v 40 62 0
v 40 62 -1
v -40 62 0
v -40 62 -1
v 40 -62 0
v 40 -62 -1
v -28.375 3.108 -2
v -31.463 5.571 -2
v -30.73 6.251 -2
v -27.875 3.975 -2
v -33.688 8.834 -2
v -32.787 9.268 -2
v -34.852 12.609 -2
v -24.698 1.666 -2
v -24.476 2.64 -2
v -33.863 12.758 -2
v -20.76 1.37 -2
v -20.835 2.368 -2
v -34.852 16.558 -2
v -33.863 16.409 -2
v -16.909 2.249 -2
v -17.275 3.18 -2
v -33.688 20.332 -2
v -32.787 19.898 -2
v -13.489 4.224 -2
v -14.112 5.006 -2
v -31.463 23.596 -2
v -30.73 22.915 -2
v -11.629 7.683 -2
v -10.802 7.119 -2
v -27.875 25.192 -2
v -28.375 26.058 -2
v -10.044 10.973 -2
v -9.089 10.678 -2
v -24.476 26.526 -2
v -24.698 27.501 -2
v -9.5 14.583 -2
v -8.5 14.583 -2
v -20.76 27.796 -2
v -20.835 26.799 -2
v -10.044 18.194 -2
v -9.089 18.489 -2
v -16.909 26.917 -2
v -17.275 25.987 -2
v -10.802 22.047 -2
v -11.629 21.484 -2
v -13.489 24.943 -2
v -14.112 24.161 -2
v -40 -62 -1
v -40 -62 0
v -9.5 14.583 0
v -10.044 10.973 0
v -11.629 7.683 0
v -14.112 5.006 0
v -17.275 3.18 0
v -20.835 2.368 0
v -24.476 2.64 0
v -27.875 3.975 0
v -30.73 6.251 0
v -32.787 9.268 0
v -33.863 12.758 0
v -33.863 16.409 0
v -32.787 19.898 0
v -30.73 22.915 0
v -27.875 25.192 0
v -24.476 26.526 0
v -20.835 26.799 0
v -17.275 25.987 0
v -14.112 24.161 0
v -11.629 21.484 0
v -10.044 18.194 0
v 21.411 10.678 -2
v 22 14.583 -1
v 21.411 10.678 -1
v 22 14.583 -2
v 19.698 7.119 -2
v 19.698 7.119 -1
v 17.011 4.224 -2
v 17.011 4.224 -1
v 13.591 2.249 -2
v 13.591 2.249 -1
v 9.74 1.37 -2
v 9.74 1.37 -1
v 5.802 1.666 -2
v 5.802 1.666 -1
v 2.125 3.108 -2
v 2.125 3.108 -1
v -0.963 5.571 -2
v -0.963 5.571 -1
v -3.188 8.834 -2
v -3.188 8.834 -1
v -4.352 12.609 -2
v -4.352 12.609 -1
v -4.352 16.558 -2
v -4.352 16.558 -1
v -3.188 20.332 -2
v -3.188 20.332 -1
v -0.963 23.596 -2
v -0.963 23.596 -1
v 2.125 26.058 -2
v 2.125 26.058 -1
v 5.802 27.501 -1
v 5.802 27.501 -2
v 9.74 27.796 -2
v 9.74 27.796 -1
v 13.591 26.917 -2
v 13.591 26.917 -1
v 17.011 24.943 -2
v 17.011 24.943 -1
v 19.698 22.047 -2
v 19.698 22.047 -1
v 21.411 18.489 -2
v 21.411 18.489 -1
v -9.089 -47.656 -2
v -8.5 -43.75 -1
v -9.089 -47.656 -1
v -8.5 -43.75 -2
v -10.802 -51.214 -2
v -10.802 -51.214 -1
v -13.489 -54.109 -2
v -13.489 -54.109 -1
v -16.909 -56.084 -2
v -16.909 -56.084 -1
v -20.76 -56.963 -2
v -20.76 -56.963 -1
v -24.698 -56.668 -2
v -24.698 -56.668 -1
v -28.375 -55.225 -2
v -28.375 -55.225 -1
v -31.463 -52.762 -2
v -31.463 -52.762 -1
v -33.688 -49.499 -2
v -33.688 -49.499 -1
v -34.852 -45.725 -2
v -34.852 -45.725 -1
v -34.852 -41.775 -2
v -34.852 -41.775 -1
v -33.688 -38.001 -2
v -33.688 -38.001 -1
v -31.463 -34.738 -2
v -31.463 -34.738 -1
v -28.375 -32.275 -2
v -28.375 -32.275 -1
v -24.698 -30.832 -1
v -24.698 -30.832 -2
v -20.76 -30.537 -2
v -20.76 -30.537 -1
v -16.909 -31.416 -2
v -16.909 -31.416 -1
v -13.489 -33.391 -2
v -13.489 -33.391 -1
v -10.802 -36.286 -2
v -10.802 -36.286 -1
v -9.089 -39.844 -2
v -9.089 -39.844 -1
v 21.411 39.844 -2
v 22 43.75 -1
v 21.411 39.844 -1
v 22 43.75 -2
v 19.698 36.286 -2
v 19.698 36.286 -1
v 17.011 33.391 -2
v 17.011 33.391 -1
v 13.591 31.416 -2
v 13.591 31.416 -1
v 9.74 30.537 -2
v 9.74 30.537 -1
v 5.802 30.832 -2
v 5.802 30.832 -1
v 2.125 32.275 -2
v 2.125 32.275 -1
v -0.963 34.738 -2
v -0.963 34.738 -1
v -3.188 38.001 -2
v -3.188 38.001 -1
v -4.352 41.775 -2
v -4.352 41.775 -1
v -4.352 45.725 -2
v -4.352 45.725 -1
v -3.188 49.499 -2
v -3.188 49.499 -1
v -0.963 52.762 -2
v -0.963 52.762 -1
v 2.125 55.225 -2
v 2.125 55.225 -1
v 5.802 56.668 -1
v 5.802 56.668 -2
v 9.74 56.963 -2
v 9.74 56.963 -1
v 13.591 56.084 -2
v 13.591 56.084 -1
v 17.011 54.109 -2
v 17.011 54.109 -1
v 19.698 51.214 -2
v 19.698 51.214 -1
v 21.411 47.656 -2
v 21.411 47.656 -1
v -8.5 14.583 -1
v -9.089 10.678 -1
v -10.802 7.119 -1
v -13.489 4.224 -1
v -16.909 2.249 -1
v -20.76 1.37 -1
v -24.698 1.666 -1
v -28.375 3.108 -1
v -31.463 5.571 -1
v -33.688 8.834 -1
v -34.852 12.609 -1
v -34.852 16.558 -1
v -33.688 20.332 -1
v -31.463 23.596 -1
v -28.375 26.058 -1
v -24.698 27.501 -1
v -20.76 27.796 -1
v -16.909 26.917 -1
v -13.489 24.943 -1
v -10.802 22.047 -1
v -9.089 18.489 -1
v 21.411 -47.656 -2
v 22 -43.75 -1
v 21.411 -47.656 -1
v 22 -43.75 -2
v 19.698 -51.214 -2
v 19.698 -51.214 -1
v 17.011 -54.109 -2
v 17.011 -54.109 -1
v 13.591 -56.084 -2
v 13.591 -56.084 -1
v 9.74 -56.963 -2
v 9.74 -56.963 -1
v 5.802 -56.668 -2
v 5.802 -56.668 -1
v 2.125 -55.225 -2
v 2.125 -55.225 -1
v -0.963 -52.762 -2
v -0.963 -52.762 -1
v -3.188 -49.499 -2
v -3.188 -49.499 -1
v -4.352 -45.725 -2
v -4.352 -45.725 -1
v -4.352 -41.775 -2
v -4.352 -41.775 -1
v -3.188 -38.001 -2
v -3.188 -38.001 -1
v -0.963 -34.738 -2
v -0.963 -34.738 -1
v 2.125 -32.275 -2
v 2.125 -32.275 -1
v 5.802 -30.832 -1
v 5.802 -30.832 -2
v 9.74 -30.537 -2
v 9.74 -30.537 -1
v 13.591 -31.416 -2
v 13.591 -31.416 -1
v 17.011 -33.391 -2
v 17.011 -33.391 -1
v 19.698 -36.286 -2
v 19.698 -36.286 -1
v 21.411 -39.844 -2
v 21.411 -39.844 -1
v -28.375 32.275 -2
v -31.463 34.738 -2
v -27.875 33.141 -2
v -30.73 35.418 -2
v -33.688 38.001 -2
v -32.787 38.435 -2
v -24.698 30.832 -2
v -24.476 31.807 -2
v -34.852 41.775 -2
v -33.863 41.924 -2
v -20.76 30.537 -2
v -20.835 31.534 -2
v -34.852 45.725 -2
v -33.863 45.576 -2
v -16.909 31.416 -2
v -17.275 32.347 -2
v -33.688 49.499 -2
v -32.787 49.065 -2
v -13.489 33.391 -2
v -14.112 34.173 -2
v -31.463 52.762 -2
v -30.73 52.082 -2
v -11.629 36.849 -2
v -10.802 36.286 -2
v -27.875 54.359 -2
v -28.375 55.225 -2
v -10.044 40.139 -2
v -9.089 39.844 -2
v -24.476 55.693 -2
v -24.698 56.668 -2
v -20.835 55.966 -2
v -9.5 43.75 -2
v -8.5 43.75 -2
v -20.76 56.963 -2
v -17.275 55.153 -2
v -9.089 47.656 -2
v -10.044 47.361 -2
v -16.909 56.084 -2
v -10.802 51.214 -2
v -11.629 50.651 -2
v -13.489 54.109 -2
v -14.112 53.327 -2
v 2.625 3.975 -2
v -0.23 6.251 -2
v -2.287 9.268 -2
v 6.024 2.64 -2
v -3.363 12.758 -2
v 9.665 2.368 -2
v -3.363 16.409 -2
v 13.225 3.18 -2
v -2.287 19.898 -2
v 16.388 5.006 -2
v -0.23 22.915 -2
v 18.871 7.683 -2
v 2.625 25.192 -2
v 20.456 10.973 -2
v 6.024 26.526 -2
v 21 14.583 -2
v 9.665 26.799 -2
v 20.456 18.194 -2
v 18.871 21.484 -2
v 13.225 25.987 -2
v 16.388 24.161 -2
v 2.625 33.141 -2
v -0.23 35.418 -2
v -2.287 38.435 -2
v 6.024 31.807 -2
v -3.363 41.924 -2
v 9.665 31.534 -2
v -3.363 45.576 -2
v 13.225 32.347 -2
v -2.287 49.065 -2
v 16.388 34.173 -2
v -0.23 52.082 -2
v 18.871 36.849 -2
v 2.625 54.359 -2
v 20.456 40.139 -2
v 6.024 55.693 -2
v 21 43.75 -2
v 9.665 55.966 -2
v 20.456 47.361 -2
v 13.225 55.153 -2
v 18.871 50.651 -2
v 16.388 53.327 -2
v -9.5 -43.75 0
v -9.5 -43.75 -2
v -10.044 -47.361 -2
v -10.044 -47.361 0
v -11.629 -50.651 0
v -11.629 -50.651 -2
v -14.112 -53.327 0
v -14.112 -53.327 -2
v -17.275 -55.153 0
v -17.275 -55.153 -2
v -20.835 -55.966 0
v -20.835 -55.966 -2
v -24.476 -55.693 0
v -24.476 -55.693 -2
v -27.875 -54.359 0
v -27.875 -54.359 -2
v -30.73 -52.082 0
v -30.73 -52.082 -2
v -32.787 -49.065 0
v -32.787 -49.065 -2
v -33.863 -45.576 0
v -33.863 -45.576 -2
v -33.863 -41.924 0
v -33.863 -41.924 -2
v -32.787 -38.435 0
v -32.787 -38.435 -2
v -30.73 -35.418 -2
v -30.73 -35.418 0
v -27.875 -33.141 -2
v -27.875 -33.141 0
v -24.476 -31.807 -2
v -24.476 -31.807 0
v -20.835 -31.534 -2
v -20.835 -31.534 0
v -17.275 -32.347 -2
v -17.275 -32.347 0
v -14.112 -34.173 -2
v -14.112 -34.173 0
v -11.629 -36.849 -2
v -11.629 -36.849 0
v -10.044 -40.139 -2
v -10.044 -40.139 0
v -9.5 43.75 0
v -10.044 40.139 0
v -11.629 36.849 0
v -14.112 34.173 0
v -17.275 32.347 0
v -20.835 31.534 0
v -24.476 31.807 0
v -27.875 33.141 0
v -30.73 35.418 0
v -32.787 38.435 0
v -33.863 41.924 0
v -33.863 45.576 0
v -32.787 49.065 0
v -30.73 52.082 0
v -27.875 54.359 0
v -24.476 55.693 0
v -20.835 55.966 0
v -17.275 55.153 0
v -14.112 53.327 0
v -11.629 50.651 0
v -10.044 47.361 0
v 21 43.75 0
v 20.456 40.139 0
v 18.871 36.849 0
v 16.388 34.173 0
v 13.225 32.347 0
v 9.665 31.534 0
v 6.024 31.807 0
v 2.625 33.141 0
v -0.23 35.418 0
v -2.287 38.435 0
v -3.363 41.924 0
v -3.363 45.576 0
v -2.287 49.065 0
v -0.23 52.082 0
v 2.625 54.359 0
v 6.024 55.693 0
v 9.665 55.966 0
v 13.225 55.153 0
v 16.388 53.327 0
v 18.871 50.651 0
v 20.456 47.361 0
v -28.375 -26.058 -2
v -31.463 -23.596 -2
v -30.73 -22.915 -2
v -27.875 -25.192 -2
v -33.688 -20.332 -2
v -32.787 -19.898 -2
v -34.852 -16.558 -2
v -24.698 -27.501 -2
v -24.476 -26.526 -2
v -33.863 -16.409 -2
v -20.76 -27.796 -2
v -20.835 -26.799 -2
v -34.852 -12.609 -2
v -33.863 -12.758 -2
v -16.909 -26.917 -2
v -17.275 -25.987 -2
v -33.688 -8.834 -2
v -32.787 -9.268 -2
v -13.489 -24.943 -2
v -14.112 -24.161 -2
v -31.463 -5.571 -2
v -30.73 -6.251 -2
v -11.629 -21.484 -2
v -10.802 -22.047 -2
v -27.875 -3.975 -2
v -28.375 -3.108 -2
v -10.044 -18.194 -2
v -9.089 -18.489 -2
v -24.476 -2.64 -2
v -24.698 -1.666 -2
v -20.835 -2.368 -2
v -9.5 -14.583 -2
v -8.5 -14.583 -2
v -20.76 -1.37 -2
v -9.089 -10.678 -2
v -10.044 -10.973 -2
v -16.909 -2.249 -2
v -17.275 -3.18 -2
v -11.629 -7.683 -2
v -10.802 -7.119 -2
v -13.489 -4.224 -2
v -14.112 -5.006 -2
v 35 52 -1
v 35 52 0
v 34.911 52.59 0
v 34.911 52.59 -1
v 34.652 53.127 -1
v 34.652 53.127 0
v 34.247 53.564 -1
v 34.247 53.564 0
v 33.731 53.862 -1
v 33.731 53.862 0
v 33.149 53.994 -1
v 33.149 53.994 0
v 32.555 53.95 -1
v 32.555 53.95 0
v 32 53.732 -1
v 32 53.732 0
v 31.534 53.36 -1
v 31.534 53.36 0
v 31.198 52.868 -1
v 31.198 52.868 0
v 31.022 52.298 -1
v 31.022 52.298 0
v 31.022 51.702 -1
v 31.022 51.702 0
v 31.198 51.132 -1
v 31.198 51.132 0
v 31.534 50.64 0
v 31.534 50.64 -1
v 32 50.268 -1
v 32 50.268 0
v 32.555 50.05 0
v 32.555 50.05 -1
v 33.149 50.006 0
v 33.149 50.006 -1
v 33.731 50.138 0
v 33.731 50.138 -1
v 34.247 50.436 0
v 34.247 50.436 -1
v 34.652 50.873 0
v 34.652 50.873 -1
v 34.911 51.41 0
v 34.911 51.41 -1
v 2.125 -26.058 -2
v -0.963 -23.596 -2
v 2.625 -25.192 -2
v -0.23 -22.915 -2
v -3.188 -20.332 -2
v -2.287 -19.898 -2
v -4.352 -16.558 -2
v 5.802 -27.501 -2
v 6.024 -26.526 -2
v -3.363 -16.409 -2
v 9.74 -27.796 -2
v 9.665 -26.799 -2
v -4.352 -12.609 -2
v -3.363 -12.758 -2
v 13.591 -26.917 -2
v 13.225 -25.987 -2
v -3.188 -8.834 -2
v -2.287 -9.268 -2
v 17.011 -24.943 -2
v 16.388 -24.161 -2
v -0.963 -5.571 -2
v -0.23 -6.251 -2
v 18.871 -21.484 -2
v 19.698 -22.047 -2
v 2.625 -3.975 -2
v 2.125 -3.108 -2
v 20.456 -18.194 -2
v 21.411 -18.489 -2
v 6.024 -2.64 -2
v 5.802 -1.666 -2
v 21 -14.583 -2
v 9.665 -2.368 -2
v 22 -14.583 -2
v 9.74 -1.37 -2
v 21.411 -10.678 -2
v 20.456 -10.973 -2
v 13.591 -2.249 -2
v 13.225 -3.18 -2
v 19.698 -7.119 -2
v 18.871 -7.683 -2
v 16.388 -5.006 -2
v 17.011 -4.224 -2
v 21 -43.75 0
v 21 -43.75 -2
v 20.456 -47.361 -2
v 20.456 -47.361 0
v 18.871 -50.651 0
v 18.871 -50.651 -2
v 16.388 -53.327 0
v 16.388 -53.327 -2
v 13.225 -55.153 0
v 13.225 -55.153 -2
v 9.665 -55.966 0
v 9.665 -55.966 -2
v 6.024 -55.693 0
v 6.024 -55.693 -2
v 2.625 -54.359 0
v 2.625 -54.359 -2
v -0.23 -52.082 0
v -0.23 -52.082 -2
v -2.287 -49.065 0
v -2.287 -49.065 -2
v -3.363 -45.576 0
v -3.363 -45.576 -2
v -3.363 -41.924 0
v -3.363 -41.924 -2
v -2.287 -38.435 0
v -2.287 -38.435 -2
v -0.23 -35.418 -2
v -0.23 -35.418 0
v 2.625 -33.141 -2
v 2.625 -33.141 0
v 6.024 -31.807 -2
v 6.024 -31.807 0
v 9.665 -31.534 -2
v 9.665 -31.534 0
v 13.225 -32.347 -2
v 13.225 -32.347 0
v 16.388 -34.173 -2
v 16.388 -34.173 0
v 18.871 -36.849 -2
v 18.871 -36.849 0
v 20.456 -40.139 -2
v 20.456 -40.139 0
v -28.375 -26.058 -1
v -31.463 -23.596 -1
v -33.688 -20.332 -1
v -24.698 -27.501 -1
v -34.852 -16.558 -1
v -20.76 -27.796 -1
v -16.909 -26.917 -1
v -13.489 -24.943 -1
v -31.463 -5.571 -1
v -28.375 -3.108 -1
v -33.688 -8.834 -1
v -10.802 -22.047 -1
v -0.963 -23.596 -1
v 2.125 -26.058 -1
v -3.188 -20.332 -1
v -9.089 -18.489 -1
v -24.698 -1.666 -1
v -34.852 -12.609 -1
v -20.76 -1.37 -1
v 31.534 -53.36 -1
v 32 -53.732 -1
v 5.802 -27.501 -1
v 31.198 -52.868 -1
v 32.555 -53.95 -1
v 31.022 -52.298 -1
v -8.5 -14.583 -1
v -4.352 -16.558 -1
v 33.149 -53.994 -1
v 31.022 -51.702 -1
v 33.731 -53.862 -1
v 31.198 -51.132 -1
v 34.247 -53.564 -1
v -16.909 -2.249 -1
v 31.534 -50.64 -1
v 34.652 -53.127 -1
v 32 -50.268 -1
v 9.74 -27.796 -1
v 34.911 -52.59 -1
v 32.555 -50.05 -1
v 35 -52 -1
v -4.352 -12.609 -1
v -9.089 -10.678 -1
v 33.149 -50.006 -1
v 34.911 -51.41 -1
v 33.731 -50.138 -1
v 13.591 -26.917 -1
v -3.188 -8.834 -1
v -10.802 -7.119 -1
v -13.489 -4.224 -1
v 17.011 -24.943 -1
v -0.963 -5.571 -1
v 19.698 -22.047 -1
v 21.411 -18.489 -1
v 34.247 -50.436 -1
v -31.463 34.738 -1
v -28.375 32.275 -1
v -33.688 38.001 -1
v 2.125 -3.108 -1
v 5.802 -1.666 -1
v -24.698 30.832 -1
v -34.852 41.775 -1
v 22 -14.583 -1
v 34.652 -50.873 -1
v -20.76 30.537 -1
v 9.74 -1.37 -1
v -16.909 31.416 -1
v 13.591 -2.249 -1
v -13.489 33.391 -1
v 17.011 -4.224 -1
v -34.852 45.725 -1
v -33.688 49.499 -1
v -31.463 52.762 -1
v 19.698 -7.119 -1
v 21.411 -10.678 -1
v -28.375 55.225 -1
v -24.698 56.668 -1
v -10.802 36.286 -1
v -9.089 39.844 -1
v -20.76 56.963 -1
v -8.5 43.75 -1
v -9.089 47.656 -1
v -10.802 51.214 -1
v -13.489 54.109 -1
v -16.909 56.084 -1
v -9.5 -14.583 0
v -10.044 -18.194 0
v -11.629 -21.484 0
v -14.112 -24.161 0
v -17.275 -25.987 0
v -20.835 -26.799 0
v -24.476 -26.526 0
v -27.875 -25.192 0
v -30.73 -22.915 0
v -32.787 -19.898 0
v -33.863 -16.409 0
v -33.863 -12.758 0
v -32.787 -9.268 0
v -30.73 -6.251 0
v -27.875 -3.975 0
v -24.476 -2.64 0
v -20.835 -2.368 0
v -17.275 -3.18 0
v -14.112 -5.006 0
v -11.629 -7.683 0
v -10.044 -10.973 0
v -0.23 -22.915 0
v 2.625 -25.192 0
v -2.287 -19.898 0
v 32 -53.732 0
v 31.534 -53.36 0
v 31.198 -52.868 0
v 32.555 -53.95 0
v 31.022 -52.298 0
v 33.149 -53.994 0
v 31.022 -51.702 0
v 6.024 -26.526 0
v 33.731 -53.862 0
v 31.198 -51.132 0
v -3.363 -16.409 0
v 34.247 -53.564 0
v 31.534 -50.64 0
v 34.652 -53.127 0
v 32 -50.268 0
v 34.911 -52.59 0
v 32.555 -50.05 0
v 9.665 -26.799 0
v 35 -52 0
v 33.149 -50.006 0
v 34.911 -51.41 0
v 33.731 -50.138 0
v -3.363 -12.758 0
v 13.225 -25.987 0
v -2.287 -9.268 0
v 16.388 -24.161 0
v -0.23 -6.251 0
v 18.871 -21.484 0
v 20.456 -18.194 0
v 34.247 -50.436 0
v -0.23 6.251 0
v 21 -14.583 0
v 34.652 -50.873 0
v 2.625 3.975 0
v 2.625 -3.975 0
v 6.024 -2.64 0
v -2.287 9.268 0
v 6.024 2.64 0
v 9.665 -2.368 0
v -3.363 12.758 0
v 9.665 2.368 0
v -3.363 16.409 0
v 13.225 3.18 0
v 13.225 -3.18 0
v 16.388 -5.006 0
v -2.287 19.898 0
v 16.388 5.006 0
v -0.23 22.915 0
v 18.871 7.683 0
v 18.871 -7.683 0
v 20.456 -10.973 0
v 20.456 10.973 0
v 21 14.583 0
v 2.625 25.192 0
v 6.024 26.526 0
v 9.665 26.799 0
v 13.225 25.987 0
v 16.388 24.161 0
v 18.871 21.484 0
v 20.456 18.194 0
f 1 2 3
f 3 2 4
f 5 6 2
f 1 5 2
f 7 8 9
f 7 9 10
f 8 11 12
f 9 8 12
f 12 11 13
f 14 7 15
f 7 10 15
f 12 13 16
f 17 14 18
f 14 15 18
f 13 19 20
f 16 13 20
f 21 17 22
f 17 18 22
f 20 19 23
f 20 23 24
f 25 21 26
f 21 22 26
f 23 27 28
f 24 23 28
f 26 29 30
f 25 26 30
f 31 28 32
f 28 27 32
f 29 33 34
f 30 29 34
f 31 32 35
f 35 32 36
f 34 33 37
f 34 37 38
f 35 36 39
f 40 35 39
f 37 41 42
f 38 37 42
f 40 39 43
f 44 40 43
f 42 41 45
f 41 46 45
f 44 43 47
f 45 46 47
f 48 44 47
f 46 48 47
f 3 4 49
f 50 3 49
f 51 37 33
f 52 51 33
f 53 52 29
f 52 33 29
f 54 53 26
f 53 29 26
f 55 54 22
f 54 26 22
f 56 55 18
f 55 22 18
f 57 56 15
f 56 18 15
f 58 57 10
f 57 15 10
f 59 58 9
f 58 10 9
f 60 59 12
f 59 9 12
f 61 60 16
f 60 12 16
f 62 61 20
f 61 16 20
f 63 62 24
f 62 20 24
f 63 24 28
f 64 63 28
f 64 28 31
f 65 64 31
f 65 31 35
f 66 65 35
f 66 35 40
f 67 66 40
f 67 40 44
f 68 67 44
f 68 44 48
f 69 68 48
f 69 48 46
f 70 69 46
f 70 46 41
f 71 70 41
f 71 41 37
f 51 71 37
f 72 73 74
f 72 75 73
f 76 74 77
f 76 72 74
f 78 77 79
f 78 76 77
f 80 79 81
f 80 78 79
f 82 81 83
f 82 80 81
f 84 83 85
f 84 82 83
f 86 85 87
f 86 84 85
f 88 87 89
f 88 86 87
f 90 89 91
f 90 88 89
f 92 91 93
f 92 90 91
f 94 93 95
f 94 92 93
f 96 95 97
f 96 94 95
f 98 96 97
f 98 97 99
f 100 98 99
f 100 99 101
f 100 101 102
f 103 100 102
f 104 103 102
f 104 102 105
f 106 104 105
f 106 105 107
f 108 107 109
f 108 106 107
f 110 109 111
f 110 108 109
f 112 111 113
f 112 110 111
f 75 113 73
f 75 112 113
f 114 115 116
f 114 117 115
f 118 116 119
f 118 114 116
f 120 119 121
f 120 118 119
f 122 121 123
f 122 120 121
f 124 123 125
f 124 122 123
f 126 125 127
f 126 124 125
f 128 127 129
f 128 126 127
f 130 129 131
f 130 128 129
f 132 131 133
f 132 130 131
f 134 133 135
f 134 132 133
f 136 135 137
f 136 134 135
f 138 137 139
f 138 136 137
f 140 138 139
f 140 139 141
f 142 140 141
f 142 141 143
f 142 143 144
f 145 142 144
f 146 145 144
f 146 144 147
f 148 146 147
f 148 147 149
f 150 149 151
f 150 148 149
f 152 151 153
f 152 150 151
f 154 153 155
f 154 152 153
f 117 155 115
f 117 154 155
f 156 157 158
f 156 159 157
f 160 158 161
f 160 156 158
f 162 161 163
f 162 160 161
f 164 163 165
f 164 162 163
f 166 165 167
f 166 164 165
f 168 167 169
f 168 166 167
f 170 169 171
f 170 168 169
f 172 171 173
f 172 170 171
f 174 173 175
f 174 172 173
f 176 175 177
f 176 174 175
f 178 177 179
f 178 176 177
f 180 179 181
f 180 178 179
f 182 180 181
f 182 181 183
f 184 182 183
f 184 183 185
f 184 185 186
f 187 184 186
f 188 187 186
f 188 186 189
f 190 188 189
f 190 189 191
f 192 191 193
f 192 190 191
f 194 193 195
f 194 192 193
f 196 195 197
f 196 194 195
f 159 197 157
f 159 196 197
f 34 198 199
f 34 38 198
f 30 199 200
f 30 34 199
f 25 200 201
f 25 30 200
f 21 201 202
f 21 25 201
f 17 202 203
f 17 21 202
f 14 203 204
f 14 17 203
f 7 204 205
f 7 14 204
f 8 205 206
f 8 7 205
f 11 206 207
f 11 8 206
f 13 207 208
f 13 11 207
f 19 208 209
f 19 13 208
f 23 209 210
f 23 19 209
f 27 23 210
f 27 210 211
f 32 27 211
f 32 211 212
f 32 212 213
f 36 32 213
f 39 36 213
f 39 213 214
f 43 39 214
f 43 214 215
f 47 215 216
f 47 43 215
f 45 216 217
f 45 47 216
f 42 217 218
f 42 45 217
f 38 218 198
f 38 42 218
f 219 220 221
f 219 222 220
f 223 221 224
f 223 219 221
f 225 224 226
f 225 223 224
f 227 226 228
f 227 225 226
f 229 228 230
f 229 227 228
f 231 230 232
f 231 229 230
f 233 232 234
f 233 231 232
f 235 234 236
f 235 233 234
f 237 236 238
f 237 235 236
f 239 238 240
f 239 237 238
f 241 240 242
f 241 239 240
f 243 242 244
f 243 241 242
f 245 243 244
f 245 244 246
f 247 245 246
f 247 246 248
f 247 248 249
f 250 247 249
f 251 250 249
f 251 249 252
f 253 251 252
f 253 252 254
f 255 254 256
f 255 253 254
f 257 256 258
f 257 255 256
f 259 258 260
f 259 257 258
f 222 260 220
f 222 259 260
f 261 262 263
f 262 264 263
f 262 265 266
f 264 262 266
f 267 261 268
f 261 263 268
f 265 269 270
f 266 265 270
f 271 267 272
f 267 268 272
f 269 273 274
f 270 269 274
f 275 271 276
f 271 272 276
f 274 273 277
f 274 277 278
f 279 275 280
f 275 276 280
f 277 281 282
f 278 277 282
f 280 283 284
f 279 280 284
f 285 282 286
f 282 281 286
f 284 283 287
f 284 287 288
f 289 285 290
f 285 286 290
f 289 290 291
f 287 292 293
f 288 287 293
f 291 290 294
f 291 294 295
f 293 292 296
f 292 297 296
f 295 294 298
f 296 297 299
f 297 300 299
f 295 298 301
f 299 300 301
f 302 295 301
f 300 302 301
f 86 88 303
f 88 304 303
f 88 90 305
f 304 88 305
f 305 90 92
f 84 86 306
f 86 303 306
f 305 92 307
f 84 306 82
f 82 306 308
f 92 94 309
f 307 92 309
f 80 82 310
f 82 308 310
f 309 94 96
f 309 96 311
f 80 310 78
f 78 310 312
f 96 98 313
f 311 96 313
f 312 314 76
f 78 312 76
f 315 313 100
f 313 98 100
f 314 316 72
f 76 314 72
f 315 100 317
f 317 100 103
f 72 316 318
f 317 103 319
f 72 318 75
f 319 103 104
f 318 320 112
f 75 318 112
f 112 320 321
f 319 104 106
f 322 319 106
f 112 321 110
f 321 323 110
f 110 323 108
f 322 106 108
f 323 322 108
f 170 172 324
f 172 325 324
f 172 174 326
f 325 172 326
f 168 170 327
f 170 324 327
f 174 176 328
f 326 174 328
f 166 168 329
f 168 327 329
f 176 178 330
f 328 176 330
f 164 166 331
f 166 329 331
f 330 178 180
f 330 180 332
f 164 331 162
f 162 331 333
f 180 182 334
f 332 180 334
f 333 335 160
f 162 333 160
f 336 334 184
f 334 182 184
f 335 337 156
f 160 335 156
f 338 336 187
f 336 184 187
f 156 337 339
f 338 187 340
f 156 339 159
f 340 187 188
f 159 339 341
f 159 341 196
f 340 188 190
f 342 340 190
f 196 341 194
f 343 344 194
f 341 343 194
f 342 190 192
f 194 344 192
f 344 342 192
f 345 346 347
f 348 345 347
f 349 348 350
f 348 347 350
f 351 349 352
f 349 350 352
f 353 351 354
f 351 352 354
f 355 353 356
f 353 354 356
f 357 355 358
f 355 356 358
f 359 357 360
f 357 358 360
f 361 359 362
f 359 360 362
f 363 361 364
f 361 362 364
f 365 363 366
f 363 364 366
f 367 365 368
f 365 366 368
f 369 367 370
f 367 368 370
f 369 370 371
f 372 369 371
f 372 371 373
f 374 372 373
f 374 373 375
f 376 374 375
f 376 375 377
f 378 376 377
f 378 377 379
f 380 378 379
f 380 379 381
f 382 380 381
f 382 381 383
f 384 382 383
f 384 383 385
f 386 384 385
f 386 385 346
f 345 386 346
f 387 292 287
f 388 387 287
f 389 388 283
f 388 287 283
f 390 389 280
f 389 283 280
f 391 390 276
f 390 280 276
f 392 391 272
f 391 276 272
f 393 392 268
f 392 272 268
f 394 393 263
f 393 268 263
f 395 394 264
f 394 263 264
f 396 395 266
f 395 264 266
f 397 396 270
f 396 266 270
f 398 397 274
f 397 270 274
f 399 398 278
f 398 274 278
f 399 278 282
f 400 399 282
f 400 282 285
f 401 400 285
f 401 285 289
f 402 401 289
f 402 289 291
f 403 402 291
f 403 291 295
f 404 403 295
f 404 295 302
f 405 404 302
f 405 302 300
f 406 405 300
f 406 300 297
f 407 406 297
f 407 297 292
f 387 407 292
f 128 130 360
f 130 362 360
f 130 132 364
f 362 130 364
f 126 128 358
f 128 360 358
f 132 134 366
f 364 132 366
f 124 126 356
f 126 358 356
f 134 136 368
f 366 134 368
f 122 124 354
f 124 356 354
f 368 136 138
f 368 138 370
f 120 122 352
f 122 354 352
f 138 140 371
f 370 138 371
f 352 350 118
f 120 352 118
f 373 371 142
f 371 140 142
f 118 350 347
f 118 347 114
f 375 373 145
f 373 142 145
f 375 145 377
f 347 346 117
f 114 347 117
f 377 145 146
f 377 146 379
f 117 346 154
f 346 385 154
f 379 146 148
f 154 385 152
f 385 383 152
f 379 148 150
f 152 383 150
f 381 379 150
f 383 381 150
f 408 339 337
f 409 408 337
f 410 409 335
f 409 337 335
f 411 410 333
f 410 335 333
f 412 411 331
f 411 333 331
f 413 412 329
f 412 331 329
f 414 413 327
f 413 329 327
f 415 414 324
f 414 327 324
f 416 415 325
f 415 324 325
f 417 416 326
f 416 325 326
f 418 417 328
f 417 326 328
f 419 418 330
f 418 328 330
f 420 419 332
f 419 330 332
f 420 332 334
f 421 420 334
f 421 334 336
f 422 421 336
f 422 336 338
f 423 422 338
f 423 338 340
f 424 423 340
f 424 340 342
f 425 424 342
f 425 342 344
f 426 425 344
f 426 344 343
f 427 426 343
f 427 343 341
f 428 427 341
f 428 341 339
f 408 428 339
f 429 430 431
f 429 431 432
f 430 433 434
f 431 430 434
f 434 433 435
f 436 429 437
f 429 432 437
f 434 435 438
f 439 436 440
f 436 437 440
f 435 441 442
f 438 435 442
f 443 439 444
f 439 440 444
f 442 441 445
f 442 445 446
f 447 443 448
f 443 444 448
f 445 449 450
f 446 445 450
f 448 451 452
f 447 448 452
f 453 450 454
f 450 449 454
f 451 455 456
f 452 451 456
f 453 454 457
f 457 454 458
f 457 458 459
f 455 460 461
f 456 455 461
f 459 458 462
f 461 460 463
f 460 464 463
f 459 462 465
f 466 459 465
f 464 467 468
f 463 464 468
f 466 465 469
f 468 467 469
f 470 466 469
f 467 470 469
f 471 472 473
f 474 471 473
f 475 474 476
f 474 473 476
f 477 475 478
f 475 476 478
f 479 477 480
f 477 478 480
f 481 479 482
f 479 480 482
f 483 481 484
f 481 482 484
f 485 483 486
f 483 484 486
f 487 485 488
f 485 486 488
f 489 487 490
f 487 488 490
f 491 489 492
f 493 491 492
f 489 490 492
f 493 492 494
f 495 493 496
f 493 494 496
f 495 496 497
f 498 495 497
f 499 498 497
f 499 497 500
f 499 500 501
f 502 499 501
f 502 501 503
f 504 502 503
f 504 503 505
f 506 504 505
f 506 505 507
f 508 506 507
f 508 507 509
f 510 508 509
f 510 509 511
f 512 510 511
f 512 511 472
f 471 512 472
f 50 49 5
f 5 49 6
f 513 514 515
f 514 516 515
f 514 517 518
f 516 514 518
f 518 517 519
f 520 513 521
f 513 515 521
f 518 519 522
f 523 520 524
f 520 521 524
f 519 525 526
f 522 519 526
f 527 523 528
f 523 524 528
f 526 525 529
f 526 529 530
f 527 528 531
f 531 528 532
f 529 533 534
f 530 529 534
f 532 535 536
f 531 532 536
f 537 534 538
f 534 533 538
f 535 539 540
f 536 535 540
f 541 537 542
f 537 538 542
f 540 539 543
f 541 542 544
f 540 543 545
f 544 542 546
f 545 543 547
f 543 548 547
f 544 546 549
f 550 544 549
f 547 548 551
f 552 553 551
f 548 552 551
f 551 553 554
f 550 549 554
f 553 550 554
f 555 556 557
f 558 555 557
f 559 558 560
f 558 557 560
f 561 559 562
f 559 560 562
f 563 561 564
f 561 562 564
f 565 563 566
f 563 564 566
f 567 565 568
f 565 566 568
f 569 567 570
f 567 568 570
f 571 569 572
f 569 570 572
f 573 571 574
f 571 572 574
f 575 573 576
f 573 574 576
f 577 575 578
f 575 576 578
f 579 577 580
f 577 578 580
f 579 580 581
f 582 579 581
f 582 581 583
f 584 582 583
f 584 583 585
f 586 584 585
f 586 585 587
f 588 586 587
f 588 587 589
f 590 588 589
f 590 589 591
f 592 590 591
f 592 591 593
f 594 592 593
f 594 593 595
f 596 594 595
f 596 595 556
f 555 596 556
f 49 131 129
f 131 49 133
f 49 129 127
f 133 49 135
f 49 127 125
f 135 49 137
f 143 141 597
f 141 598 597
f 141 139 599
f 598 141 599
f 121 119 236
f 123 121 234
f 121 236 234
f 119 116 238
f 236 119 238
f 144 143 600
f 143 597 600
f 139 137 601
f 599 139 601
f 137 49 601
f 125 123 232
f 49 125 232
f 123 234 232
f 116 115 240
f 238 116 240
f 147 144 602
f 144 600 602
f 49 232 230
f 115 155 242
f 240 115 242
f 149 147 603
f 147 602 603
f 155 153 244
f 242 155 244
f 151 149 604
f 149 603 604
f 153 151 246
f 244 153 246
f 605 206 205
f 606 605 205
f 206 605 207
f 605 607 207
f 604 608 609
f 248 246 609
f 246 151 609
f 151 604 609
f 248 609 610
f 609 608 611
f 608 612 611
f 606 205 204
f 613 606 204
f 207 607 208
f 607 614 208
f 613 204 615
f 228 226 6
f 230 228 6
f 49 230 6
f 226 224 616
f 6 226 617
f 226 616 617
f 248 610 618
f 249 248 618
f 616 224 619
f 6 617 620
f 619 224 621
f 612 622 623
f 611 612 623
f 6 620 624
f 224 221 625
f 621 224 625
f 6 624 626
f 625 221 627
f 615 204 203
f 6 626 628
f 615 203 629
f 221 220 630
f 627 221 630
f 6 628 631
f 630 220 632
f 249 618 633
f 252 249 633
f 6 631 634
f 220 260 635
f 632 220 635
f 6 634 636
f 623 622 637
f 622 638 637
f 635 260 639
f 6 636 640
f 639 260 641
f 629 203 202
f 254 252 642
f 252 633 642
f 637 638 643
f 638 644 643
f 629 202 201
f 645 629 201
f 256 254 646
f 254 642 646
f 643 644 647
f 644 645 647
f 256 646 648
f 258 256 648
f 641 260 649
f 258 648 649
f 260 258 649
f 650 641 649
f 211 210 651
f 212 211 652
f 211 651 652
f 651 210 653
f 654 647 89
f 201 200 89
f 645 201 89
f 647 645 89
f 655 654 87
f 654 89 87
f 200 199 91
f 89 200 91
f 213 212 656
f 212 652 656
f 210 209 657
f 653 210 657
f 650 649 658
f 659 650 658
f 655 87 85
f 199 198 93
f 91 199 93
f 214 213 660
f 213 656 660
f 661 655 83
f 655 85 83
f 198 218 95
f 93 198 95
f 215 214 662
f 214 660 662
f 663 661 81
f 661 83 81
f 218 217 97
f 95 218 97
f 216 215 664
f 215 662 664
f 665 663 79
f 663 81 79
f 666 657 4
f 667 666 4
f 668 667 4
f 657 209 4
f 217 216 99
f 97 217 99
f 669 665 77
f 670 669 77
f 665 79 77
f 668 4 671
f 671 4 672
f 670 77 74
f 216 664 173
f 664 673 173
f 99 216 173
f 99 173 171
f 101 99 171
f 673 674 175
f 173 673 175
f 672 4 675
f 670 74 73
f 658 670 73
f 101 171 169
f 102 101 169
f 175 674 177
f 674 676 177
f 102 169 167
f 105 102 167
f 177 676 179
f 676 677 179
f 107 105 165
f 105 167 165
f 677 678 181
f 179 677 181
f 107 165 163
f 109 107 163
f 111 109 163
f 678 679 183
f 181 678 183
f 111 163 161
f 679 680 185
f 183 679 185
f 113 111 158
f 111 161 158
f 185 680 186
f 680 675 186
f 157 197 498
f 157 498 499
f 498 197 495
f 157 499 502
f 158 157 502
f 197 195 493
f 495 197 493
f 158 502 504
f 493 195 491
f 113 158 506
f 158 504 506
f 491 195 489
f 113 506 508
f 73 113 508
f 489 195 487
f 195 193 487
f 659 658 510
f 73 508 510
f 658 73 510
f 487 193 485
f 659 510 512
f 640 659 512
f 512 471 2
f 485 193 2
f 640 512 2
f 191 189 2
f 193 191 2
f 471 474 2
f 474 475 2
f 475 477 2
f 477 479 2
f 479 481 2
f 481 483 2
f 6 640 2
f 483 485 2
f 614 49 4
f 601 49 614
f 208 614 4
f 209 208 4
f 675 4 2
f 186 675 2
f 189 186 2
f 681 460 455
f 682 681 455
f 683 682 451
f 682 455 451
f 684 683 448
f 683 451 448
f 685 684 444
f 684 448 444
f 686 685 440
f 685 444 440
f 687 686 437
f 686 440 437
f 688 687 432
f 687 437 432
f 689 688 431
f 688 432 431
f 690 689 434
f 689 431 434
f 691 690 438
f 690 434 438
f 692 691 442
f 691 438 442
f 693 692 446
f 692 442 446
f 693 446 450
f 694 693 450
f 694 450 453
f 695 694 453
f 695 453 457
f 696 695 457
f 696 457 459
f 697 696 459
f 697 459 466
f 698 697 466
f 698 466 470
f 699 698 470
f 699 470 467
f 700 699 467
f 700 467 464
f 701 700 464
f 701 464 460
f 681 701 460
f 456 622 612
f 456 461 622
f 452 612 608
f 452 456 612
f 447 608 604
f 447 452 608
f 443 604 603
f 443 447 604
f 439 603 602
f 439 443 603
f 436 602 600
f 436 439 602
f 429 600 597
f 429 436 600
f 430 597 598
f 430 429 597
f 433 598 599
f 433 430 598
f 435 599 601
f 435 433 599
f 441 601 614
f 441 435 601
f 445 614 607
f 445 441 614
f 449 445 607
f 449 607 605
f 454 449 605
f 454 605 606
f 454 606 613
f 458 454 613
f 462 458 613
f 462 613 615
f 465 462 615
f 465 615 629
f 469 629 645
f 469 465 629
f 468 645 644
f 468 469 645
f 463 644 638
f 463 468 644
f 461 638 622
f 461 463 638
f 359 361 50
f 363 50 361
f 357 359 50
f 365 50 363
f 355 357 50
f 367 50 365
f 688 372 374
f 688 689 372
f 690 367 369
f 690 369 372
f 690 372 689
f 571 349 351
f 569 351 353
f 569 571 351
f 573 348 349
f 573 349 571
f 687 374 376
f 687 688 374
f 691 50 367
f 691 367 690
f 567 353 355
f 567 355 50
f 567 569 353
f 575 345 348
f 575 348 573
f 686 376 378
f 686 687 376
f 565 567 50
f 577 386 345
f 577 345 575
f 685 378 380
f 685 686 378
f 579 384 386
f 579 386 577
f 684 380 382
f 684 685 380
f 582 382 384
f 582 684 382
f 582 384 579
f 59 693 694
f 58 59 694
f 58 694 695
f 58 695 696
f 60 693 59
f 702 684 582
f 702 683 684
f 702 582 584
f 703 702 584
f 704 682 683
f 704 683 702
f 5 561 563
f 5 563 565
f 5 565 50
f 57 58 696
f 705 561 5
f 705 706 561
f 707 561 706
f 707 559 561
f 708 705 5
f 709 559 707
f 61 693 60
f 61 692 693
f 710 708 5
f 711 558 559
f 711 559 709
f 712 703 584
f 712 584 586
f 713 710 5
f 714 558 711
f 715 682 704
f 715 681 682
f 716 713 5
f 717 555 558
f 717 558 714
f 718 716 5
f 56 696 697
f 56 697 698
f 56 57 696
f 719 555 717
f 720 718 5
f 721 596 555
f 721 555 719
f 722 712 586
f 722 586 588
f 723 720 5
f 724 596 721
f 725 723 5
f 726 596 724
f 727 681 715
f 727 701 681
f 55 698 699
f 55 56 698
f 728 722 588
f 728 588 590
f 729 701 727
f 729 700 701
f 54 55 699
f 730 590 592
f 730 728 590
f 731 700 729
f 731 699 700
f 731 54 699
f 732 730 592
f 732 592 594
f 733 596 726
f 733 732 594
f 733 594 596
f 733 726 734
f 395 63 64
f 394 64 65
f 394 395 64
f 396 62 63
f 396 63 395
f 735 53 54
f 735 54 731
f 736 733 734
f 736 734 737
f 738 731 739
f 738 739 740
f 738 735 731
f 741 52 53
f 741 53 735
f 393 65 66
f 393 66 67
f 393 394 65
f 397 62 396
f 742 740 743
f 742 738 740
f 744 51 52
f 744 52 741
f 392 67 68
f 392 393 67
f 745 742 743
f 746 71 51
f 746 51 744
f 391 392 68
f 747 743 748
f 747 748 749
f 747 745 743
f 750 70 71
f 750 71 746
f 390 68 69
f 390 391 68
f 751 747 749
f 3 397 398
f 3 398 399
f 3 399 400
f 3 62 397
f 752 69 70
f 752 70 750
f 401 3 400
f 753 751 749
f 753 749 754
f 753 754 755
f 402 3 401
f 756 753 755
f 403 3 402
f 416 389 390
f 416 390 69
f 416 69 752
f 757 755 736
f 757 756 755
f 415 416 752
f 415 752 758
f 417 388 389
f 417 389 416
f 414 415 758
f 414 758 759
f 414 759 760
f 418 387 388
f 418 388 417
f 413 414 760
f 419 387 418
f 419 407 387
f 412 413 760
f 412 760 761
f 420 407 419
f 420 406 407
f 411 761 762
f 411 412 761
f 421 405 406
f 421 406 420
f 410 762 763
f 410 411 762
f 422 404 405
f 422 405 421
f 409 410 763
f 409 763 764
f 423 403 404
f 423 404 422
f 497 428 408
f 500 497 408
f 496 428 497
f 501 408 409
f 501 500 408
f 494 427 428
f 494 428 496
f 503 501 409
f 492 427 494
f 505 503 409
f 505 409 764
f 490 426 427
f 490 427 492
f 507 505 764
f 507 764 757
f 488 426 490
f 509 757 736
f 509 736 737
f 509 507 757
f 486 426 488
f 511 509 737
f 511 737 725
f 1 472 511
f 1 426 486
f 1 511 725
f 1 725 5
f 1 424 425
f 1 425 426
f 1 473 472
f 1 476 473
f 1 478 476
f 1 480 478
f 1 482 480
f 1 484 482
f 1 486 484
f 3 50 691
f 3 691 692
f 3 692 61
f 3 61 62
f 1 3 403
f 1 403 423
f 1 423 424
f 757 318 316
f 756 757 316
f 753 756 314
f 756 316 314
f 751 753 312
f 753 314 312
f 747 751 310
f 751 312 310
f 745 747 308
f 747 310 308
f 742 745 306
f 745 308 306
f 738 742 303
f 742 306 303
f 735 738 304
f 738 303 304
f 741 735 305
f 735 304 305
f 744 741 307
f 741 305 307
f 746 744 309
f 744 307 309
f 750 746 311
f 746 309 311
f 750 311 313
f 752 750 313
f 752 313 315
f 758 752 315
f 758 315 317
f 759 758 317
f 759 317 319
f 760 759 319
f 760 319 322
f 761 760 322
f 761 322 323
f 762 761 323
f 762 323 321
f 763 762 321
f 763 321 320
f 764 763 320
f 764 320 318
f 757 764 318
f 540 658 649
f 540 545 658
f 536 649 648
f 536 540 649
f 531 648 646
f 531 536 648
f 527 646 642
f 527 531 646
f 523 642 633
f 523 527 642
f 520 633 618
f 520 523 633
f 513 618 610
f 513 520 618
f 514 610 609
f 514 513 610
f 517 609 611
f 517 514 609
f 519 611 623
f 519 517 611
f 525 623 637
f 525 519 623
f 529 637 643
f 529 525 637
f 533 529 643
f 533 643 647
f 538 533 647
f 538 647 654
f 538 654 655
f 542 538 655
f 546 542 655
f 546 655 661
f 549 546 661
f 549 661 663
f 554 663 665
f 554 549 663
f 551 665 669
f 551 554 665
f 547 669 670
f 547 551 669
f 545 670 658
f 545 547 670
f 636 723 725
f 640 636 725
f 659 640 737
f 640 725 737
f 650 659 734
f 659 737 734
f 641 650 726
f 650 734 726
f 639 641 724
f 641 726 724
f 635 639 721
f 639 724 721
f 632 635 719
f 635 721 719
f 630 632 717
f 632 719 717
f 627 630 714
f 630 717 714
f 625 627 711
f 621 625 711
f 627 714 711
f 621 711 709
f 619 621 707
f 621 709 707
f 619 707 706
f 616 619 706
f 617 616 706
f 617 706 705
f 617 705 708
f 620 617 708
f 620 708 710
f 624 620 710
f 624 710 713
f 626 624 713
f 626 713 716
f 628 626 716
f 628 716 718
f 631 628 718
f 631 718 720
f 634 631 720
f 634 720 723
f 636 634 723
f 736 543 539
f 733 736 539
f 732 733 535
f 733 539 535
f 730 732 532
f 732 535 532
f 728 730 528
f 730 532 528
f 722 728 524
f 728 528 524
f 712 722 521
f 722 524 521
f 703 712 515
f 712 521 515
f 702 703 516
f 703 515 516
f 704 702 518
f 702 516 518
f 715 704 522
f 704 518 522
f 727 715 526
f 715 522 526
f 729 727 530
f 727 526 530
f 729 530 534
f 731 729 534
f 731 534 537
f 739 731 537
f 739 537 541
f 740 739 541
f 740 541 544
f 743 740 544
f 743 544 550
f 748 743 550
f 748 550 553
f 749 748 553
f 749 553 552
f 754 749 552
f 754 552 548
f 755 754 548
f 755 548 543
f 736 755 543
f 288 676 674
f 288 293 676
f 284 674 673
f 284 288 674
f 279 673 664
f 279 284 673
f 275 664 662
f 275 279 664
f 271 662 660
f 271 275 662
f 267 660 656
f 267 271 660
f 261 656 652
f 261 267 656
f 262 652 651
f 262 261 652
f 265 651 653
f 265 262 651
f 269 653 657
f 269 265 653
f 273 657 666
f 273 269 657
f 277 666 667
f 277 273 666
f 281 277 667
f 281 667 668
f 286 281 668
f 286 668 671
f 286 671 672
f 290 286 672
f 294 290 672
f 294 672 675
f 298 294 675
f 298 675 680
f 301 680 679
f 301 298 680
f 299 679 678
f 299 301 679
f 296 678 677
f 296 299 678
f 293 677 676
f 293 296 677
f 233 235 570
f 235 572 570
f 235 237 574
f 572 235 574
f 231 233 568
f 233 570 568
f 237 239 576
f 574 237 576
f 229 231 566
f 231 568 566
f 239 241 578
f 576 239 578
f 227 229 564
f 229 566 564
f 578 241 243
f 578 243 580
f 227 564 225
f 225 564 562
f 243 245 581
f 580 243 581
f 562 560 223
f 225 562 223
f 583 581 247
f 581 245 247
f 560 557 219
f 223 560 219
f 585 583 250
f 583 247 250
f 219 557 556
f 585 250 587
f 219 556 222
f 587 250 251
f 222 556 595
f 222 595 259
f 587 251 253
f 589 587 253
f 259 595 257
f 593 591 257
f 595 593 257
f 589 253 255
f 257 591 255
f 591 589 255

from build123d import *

# Parameters (mm, degrees)
F0_W     = 80
F0_H     = 124
F0_R     = 13.25
F0_R_2   = 12.25
F4_R     = 2
F5_DEPTH = 2


with BuildPart() as f2:
    # F2: sweep along a path in F1
    with BuildLine(Plane.YZ) as f2_path:
        Line((62, 0), (62, -1))
    # F0 (on Top) → F2 (sweep)
    with BuildSketch(Plane.XY):
        Rectangle(F0_W, F0_H)
        with Locations((-21.75, -43.75)):
            Circle(F0_R, mode=Mode.SUBTRACT)
        with Locations((-21.75, -14.583333)):
            Circle(F0_R, mode=Mode.SUBTRACT)
        with Locations((8.75, -43.75)):
            Circle(F0_R, mode=Mode.SUBTRACT)
        with Locations((8.75, -14.583333)):
            Circle(F0_R, mode=Mode.SUBTRACT)
        with Locations((-21.75, 14.583333)):
            Circle(F0_R, mode=Mode.SUBTRACT)
        with Locations((-21.75, 43.75)):
            Circle(F0_R, mode=Mode.SUBTRACT)
        with Locations((8.75, 14.583333)):
            Circle(F0_R, mode=Mode.SUBTRACT)
        with Locations((8.75, 43.75)):
            Circle(F0_R, mode=Mode.SUBTRACT)
    sweep(path=f2_path.line)

    # F3: sweep along a path in F1
    with BuildLine(Plane.YZ) as f3_path:
        Line((62, 0), (62, -1))
        Line((62, -1), (62, -2))
    # F0 (on Top) → F3 (sweep)
    with BuildSketch(Plane.XY):
        with Locations((-21.75, -14.583333)):
            Circle(F0_R)
        with Locations((-21.75, -14.583333)):
            Circle(F0_R_2, mode=Mode.SUBTRACT)
        with Locations((-21.75, 14.583333)):
            Circle(F0_R)
        with Locations((-21.75, 14.583333)):
            Circle(F0_R_2, mode=Mode.SUBTRACT)
        with Locations((-21.75, -43.75)):
            Circle(F0_R)
        with Locations((-21.75, -43.75)):
            Circle(F0_R_2, mode=Mode.SUBTRACT)
        with Locations((8.75, -43.75)):
            Circle(F0_R)
        with Locations((8.75, -43.75)):
            Circle(F0_R_2, mode=Mode.SUBTRACT)
        with Locations((8.75, -14.583333)):
            Circle(F0_R)
        with Locations((8.75, -14.583333)):
            Circle(F0_R_2, mode=Mode.SUBTRACT)
        with Locations((8.75, 14.583333)):
            Circle(F0_R)
        with Locations((8.75, 14.583333)):
            Circle(F0_R_2, mode=Mode.SUBTRACT)
        with Locations((8.75, 43.75)):
            Circle(F0_R)
        with Locations((8.75, 43.75)):
            Circle(F0_R_2, mode=Mode.SUBTRACT)
        with Locations((-21.75, 43.75)):
            Circle(F0_R)
        with Locations((-21.75, 43.75)):
            Circle(F0_R_2, mode=Mode.SUBTRACT)
    sweep(path=f3_path.line)

    # F4 (on face) → F5 (cut)
    with BuildSketch(Plane.XY):
        with Locations((33, 52)):
            Circle(F4_R)
        with Locations((33, -52)):
            Circle(F4_R)
    extrude(amount=-F5_DEPTH, mode=Mode.SUBTRACT)


solid = f2.part
